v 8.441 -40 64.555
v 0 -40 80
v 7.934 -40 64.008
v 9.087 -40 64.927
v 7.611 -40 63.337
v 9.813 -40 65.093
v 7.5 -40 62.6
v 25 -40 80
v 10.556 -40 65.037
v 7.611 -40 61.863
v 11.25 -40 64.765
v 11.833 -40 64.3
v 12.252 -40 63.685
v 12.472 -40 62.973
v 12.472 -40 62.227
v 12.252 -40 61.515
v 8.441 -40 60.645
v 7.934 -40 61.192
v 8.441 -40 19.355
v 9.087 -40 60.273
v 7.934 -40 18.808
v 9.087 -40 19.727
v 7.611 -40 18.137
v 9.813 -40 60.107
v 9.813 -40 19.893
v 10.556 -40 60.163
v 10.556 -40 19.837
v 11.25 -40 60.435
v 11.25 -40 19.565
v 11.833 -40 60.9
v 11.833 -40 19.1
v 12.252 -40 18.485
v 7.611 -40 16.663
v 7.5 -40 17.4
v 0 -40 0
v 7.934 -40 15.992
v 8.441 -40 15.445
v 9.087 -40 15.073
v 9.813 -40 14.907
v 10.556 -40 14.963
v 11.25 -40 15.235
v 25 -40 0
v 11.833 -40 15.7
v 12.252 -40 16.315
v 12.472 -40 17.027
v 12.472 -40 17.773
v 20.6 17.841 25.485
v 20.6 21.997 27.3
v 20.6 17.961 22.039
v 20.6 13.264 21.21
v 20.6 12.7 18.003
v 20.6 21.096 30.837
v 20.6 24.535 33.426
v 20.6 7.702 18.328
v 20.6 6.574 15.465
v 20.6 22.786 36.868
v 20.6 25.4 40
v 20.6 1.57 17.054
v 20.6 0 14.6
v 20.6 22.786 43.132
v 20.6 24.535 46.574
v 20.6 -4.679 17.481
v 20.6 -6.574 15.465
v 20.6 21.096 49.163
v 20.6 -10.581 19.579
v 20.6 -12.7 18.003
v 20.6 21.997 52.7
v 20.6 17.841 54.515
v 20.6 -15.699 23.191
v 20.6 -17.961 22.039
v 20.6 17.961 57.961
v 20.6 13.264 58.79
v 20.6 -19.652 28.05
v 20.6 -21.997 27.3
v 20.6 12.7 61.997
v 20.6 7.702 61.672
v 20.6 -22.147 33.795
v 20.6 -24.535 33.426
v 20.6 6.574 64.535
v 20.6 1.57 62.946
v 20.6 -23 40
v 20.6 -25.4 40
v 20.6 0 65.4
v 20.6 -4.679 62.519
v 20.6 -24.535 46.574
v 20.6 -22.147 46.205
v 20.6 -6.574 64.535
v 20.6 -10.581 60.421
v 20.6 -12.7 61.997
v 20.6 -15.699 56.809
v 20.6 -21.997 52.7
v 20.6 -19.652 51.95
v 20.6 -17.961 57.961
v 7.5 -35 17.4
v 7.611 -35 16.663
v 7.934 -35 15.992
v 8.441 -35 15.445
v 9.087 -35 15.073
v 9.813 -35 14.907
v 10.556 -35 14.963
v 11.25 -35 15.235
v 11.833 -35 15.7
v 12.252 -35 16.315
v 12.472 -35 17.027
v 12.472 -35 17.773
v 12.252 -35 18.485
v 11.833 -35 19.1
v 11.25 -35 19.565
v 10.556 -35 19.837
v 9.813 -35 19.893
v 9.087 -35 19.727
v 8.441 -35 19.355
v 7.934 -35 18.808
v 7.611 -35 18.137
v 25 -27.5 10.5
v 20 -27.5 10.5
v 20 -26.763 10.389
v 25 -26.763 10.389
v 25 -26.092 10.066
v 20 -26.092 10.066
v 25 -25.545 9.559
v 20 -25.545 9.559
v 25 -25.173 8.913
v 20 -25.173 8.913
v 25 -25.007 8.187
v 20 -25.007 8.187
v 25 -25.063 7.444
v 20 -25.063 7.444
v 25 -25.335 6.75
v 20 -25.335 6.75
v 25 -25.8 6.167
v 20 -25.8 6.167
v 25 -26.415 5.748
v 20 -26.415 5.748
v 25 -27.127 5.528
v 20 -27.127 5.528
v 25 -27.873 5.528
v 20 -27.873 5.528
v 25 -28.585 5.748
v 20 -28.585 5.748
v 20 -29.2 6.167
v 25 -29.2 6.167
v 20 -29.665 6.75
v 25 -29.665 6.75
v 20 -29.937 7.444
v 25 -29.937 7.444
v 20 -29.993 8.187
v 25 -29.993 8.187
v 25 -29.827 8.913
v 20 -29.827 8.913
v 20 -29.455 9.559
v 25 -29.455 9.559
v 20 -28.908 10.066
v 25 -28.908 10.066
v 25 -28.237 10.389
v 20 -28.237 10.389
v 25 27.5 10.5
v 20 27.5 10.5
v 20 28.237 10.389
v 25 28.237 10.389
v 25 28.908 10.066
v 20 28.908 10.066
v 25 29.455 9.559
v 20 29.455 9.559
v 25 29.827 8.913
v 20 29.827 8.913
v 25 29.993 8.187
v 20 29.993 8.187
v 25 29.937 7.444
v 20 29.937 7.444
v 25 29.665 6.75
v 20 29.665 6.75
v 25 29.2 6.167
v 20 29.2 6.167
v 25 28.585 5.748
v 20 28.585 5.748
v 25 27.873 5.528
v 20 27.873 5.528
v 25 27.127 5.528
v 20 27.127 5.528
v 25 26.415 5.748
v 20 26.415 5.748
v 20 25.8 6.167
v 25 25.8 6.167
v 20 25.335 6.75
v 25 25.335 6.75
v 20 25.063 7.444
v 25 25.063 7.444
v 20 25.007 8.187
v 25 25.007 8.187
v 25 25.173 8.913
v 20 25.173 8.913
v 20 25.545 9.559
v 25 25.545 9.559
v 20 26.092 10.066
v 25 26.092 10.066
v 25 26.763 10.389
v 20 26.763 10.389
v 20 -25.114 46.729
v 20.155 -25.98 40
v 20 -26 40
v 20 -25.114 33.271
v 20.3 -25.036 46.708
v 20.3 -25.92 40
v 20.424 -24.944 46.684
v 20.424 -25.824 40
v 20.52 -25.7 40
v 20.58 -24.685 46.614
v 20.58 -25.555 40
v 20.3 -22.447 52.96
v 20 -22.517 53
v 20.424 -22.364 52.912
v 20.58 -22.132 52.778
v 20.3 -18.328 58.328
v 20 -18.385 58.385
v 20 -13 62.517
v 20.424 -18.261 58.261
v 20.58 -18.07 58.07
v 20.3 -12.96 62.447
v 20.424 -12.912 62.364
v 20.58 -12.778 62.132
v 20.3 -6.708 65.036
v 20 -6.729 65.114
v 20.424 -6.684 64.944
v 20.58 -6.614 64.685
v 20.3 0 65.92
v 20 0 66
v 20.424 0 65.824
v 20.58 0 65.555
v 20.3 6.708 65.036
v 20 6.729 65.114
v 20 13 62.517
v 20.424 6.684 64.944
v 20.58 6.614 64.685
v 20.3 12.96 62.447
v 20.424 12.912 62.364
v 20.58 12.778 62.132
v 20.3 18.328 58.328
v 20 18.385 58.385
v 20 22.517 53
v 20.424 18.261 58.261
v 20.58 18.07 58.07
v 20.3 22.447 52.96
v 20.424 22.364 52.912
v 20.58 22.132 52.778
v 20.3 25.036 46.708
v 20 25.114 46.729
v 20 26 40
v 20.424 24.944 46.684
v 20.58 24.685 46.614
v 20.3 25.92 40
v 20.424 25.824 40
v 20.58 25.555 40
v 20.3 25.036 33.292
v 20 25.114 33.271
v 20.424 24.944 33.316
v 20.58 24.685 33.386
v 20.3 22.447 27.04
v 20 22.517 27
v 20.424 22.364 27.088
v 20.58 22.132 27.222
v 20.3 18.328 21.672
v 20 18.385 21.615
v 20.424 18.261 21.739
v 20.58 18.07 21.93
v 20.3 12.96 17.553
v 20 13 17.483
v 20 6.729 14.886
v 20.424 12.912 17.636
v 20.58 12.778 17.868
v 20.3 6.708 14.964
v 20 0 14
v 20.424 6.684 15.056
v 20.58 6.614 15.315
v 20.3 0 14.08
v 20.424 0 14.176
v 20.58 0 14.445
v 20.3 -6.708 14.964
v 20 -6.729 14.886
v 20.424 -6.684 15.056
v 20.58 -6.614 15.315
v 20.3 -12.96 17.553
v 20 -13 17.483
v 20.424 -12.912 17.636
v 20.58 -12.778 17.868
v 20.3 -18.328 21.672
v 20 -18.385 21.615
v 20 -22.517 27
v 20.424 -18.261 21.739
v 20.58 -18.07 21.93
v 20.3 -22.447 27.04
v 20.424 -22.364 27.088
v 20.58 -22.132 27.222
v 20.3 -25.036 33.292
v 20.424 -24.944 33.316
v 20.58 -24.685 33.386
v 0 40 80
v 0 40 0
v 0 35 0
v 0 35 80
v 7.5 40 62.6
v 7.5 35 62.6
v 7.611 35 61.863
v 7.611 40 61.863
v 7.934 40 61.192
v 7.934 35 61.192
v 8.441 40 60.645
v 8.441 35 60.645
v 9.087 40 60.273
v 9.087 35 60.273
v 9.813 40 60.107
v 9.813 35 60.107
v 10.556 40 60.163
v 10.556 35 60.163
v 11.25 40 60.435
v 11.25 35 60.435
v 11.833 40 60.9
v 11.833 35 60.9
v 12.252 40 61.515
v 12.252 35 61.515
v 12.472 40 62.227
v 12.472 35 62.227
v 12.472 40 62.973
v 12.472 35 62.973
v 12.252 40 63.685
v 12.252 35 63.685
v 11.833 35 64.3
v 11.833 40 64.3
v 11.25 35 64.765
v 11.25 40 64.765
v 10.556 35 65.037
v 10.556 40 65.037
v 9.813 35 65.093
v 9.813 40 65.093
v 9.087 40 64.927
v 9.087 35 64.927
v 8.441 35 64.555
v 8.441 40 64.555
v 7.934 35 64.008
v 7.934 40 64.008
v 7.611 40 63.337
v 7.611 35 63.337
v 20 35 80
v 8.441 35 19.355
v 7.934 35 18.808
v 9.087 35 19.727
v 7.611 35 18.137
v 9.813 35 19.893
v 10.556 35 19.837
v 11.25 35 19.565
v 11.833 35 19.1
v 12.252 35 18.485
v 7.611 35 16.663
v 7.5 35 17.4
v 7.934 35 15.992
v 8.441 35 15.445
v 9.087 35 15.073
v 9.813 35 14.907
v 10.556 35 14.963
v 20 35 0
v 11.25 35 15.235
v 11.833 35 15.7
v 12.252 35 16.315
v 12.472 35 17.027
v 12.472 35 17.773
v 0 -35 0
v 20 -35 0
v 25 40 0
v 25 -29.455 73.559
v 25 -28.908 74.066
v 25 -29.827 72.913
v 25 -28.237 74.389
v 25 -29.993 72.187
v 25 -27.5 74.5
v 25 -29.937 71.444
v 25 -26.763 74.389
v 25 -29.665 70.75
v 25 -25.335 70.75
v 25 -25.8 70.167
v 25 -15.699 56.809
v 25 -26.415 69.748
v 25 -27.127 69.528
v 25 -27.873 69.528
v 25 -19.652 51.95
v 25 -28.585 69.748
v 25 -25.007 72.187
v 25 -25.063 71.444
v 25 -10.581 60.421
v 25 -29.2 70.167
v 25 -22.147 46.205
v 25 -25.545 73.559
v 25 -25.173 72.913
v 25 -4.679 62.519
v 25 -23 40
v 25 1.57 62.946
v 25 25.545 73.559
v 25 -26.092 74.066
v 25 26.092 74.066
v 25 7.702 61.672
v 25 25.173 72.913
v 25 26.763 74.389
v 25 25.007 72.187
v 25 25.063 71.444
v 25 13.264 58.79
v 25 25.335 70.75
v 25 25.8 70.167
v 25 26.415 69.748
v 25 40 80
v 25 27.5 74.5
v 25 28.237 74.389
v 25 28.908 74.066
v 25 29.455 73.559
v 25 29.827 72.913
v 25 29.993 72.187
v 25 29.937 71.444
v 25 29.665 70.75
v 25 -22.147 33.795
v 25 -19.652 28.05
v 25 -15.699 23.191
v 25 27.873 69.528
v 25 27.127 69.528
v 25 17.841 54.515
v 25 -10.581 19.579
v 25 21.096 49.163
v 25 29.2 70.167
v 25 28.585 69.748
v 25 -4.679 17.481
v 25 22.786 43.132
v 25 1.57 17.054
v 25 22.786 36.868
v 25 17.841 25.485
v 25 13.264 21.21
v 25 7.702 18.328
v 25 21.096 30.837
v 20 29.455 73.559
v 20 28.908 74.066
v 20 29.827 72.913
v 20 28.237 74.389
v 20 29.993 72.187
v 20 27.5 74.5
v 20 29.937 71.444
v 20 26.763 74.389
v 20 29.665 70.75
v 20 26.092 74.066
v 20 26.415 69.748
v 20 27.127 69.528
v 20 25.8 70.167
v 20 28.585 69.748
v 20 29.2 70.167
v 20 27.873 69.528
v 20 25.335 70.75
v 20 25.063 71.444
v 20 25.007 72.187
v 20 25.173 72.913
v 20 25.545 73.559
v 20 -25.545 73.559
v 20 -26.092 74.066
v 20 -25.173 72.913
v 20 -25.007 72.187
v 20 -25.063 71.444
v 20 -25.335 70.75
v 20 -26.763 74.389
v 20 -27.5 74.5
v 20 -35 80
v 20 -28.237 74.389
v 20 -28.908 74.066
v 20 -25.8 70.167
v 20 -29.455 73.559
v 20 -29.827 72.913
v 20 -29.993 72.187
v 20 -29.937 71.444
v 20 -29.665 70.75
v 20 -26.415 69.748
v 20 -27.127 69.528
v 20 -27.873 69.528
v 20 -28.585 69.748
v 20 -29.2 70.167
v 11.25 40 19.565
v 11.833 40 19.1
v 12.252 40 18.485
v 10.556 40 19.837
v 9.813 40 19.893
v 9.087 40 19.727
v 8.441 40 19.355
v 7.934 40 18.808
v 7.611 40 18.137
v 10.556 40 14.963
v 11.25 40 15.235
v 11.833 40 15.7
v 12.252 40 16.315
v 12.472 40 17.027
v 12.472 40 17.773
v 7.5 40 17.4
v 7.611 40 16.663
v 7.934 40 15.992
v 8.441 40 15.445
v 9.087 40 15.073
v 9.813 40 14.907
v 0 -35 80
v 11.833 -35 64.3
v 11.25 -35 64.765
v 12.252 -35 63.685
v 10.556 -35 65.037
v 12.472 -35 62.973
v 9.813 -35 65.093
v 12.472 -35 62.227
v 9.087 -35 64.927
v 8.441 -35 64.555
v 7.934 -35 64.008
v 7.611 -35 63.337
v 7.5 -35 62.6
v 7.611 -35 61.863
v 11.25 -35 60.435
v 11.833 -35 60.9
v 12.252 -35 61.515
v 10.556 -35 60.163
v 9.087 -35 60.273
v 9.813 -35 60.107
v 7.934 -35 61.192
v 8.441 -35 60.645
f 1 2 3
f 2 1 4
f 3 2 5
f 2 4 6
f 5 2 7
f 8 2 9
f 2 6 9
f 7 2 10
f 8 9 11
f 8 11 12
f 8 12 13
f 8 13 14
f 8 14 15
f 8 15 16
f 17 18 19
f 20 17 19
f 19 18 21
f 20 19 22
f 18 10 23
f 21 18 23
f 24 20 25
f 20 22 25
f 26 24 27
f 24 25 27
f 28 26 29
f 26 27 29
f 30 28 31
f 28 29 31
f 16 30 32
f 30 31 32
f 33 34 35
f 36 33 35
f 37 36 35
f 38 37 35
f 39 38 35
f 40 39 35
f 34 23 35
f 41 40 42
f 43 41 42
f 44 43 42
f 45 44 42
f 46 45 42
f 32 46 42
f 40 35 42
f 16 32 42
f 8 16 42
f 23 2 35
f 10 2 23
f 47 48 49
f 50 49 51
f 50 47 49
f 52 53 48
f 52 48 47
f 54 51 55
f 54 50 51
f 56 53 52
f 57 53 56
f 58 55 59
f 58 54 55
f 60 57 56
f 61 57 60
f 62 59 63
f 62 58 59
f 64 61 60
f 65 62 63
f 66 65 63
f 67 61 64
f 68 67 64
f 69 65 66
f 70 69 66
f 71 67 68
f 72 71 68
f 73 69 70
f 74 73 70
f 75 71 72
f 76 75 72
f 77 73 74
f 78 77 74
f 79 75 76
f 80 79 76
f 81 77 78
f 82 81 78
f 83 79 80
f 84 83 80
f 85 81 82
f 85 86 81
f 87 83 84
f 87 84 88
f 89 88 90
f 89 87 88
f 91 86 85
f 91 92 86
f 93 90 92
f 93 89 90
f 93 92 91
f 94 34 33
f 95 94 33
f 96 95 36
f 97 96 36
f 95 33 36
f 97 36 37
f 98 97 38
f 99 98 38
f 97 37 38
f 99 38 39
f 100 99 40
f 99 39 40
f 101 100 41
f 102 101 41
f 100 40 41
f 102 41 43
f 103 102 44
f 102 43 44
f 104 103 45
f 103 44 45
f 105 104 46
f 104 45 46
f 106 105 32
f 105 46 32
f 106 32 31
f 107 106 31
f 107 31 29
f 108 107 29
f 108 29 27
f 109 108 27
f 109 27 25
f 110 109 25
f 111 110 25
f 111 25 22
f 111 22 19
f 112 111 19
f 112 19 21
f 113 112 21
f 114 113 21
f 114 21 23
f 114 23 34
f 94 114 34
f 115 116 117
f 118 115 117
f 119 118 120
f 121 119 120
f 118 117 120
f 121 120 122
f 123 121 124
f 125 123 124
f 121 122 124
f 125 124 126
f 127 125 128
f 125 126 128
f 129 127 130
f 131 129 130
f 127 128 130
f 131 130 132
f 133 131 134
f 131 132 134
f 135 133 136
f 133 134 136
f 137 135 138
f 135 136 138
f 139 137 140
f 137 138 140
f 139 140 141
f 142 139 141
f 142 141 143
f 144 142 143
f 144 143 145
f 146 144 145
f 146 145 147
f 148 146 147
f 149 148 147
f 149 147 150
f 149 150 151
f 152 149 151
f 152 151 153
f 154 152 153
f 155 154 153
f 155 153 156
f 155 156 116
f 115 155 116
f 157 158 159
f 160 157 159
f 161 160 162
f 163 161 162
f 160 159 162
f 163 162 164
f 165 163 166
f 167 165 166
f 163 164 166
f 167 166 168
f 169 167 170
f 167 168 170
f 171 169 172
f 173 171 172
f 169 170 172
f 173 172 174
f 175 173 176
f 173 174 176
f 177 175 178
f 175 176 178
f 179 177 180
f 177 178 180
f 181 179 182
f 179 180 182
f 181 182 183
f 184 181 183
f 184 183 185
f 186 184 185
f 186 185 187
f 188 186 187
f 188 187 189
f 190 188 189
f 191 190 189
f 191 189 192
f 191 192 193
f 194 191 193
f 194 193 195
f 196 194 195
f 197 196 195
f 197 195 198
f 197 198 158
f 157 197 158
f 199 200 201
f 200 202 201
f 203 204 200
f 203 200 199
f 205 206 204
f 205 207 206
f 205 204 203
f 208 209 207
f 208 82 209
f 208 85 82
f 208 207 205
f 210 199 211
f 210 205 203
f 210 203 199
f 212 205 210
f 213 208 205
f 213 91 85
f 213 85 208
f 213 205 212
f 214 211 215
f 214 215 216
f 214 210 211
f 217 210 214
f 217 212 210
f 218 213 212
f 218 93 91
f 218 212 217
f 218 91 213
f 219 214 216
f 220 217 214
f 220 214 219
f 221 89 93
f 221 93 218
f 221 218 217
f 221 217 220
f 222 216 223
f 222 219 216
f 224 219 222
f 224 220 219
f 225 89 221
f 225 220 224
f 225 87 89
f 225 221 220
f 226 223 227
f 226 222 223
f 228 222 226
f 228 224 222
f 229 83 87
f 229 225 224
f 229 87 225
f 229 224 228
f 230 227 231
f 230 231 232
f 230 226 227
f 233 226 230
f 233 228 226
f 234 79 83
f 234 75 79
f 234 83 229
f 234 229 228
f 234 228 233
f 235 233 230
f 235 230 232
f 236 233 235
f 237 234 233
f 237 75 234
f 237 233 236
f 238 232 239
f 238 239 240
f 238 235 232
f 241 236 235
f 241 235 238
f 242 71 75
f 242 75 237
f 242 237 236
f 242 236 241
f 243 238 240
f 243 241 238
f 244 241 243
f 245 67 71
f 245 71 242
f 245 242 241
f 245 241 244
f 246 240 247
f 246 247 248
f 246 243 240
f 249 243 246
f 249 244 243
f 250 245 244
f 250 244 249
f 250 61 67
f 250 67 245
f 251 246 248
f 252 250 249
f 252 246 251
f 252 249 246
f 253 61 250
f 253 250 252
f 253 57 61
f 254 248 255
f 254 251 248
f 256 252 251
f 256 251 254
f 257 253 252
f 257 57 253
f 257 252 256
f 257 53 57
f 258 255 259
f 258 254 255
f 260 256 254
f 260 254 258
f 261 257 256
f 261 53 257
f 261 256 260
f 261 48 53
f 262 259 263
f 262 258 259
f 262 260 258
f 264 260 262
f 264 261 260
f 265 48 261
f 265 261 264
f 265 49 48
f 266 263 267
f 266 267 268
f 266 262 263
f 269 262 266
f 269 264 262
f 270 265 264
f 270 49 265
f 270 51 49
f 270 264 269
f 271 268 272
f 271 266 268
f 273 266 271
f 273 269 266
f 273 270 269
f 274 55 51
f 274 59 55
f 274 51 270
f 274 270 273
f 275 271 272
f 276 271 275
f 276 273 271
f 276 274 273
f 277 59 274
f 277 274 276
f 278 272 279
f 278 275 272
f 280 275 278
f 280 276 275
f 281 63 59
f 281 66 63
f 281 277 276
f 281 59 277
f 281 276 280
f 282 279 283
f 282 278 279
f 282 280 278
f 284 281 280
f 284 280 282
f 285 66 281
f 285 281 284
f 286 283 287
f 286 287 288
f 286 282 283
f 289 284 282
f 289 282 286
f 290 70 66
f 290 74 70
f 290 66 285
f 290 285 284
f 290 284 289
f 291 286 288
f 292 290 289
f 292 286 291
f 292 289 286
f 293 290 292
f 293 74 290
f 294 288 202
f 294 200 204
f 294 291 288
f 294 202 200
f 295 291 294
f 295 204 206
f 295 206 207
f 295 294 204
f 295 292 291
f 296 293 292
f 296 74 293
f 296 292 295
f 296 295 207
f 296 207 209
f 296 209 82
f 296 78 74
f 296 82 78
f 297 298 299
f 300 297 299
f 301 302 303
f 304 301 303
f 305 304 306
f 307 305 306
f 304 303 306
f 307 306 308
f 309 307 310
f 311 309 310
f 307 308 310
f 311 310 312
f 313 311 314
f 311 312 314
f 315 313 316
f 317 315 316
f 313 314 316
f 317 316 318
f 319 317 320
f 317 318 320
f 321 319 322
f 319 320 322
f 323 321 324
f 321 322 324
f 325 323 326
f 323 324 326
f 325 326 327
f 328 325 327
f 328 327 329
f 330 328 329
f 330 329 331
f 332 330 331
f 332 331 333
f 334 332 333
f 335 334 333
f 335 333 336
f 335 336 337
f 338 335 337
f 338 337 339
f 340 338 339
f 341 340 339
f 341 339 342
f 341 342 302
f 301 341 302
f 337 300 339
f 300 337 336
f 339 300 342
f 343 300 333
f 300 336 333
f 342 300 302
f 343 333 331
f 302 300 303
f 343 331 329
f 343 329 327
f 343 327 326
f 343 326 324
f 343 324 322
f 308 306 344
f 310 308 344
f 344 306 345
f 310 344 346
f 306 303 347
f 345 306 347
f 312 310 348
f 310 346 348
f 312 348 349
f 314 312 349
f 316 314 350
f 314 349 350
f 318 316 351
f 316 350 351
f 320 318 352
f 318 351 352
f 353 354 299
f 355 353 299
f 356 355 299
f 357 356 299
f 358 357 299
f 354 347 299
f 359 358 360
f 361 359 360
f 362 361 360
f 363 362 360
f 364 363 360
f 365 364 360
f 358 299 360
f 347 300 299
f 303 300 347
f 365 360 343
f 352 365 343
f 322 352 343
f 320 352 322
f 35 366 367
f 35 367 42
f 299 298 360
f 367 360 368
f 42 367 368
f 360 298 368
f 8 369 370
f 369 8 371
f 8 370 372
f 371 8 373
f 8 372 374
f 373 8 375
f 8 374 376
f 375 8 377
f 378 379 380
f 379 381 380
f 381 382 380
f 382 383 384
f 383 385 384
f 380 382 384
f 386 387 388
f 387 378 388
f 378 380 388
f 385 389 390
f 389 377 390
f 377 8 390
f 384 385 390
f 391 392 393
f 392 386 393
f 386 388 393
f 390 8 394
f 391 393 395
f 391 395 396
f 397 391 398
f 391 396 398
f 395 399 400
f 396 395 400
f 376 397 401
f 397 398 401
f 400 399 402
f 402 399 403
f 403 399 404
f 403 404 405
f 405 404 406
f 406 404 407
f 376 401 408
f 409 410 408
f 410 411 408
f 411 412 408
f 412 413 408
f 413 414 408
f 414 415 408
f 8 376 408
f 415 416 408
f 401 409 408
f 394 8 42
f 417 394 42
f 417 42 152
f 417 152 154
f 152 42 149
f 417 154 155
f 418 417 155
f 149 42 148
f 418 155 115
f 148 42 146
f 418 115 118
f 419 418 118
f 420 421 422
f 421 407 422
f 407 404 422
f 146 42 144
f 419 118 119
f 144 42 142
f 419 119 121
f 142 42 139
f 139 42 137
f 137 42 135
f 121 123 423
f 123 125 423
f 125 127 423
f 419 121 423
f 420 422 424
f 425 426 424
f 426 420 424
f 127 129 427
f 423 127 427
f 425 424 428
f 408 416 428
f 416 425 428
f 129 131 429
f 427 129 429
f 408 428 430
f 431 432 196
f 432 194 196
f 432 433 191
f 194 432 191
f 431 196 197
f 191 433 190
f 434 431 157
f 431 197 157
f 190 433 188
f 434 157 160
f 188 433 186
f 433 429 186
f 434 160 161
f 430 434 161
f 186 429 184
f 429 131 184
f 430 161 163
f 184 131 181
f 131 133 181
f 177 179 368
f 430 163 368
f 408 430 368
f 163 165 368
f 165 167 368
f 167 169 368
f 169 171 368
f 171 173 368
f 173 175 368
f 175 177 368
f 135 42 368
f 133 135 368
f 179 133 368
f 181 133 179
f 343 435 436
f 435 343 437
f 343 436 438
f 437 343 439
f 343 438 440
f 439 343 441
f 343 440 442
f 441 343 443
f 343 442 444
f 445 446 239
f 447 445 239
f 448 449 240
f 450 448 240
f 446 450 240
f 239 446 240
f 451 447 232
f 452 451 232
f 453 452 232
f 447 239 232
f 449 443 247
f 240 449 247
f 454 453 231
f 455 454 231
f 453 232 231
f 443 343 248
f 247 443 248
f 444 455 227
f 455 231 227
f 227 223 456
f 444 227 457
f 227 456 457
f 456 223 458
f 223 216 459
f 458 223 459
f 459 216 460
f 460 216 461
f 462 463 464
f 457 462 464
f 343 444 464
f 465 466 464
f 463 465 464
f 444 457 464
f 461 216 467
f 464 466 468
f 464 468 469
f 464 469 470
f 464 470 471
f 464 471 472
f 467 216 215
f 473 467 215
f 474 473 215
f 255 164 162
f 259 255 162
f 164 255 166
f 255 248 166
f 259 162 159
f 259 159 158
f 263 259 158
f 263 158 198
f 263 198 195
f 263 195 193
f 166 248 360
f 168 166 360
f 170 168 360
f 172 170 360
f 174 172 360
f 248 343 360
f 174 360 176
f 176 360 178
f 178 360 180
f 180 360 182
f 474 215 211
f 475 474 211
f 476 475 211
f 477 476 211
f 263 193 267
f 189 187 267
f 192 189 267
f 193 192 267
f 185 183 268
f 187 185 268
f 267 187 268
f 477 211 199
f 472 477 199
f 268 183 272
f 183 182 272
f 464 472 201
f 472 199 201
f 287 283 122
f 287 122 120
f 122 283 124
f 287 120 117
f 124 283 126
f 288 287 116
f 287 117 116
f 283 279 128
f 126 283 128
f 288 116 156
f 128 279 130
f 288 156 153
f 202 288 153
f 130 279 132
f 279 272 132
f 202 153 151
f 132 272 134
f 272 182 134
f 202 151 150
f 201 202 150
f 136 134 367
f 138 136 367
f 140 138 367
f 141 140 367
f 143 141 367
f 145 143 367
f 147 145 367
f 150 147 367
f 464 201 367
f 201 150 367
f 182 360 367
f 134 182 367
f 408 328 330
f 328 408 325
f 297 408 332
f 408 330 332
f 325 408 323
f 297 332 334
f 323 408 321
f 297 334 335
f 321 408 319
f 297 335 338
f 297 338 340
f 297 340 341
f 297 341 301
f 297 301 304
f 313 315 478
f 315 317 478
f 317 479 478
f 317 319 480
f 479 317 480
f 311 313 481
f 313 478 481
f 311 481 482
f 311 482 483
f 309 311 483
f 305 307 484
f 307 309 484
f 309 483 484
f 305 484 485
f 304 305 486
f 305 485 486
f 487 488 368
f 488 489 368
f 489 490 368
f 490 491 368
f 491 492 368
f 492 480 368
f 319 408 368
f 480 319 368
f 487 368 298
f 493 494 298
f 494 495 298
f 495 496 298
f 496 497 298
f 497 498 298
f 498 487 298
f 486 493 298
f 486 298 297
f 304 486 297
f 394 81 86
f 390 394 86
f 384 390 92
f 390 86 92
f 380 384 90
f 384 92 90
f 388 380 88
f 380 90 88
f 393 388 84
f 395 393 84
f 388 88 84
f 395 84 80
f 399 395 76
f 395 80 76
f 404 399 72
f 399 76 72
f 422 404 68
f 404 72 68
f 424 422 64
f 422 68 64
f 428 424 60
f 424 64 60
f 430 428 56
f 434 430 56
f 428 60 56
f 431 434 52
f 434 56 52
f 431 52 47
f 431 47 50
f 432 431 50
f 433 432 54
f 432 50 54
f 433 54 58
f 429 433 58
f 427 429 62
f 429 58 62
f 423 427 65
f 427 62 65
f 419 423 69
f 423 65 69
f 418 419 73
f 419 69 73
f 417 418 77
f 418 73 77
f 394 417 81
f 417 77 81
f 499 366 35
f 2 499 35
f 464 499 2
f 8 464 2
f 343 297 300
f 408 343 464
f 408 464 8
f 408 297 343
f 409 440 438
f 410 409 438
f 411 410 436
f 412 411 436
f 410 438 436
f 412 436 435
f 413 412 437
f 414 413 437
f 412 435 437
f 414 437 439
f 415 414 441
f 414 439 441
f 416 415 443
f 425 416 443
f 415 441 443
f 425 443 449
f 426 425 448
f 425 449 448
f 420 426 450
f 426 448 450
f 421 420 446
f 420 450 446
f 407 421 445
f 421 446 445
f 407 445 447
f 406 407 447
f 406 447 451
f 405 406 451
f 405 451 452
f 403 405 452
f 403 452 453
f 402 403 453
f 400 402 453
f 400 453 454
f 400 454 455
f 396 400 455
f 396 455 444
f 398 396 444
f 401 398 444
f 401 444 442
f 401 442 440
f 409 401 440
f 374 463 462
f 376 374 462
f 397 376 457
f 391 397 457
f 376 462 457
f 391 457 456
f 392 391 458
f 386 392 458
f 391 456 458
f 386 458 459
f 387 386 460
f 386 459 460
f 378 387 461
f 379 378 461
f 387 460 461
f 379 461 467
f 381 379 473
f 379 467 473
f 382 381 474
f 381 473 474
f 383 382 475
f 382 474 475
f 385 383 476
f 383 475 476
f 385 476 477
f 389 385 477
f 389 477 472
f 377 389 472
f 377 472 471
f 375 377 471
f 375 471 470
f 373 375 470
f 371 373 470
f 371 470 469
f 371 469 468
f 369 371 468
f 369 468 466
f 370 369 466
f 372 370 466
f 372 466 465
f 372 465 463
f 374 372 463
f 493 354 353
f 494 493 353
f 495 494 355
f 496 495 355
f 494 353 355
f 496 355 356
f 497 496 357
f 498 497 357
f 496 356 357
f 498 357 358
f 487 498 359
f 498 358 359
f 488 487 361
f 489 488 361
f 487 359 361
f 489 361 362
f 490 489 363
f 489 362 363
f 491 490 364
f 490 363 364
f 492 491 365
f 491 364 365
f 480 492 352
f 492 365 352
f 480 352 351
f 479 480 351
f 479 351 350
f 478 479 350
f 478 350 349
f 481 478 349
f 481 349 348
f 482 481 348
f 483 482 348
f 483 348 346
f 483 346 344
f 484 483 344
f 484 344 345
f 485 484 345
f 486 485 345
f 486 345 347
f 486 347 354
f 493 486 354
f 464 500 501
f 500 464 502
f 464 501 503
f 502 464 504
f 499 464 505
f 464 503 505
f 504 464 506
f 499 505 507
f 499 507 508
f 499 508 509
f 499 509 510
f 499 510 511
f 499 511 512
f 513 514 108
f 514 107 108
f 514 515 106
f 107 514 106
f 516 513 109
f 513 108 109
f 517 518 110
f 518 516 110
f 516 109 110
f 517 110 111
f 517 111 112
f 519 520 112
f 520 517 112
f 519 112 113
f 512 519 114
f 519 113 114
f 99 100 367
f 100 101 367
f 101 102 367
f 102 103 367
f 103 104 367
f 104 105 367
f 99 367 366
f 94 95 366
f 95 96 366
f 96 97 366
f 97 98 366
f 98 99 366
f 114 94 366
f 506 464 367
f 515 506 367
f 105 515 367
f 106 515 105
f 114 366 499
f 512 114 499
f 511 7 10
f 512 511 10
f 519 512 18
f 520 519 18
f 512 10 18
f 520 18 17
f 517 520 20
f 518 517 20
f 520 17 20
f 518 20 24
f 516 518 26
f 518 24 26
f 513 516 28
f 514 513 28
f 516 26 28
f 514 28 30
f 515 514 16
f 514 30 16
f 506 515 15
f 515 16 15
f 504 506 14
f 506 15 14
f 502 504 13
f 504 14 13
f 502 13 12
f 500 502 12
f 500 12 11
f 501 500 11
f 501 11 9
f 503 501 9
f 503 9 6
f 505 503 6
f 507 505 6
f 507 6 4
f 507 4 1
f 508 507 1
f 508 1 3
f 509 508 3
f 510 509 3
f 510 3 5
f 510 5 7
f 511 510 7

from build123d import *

# Parameters (mm, degrees)
BOSS_EXTRUDE1_DEPTH   = 80
SKETCH2_R             = 26
CUT_EXTRUDE1_DEPTH    = 0.6
FILLET1_R             = 0.6
SKETCH3_R             = 23
CUT_EXTRUDE2_DEPTH    = 4.4
M6X1_0_TAPPED_HOLE1_D = 5
M6X1_0_TAPPED_HOLE2_D = 5


with BuildPart() as part:
    # Sketch1 → Boss-Extrude1 (new body)
    with BuildSketch(Plane.XY):
        Polygon((0, 35), (20, 35), (20, -35), (0, -35), (0, -40), (25, -40), (25, 40), (0, 40), align=None)
    extrude(amount=BOSS_EXTRUDE1_DEPTH)

    # Sketch2 → Cut-Extrude1 (cut)
    with BuildSketch(Plane.ZY.offset(-20)):
        with Locations(Location((40, 0, 0), (0, 0, 270))):
            Circle(SKETCH2_R)
    extrude(amount=-CUT_EXTRUDE1_DEPTH, mode=Mode.SUBTRACT)

    # Fillet1
    fillet1_edges = [part.edges().sort_by_distance(p)[0] for p in [
        (20.6, 26, 40),
    ]]
    fillet(fillet1_edges, radius=FILLET1_R - 0.0001)  # a hair under: the kernel refuses the full size

    # Sketch3 → Cut-Extrude2 (cut)
    with BuildSketch(Plane.ZY.offset(-20.6)):
        with Locations(Location((40, 0, 0), (0, 0, 270))):
            Circle(SKETCH3_R)
    extrude(amount=-CUT_EXTRUDE2_DEPTH, mode=Mode.SUBTRACT)

    # M6x1.0 Tapped Hole1 (through all)
    with Locations(Plane(origin=(0, 40, 0), x_dir=(1, 0, 0), z_dir=(0, 1, 0))):
        with Locations((10, -17.4), (10, -62.6)):
            Hole(M6X1_0_TAPPED_HOLE1_D / 2)

    # M6x1.0 Tapped Hole2 (through all)
    with Locations(Plane(origin=(25, 0, 0), x_dir=(0, 0, -1), z_dir=(1, 0, 0))):
        with Locations((-72, 27.5), (-8, 27.5), (-8, -27.5), (-72, -27.5)):
            Hole(M6X1_0_TAPPED_HOLE2_D / 2)


solid = part.part
